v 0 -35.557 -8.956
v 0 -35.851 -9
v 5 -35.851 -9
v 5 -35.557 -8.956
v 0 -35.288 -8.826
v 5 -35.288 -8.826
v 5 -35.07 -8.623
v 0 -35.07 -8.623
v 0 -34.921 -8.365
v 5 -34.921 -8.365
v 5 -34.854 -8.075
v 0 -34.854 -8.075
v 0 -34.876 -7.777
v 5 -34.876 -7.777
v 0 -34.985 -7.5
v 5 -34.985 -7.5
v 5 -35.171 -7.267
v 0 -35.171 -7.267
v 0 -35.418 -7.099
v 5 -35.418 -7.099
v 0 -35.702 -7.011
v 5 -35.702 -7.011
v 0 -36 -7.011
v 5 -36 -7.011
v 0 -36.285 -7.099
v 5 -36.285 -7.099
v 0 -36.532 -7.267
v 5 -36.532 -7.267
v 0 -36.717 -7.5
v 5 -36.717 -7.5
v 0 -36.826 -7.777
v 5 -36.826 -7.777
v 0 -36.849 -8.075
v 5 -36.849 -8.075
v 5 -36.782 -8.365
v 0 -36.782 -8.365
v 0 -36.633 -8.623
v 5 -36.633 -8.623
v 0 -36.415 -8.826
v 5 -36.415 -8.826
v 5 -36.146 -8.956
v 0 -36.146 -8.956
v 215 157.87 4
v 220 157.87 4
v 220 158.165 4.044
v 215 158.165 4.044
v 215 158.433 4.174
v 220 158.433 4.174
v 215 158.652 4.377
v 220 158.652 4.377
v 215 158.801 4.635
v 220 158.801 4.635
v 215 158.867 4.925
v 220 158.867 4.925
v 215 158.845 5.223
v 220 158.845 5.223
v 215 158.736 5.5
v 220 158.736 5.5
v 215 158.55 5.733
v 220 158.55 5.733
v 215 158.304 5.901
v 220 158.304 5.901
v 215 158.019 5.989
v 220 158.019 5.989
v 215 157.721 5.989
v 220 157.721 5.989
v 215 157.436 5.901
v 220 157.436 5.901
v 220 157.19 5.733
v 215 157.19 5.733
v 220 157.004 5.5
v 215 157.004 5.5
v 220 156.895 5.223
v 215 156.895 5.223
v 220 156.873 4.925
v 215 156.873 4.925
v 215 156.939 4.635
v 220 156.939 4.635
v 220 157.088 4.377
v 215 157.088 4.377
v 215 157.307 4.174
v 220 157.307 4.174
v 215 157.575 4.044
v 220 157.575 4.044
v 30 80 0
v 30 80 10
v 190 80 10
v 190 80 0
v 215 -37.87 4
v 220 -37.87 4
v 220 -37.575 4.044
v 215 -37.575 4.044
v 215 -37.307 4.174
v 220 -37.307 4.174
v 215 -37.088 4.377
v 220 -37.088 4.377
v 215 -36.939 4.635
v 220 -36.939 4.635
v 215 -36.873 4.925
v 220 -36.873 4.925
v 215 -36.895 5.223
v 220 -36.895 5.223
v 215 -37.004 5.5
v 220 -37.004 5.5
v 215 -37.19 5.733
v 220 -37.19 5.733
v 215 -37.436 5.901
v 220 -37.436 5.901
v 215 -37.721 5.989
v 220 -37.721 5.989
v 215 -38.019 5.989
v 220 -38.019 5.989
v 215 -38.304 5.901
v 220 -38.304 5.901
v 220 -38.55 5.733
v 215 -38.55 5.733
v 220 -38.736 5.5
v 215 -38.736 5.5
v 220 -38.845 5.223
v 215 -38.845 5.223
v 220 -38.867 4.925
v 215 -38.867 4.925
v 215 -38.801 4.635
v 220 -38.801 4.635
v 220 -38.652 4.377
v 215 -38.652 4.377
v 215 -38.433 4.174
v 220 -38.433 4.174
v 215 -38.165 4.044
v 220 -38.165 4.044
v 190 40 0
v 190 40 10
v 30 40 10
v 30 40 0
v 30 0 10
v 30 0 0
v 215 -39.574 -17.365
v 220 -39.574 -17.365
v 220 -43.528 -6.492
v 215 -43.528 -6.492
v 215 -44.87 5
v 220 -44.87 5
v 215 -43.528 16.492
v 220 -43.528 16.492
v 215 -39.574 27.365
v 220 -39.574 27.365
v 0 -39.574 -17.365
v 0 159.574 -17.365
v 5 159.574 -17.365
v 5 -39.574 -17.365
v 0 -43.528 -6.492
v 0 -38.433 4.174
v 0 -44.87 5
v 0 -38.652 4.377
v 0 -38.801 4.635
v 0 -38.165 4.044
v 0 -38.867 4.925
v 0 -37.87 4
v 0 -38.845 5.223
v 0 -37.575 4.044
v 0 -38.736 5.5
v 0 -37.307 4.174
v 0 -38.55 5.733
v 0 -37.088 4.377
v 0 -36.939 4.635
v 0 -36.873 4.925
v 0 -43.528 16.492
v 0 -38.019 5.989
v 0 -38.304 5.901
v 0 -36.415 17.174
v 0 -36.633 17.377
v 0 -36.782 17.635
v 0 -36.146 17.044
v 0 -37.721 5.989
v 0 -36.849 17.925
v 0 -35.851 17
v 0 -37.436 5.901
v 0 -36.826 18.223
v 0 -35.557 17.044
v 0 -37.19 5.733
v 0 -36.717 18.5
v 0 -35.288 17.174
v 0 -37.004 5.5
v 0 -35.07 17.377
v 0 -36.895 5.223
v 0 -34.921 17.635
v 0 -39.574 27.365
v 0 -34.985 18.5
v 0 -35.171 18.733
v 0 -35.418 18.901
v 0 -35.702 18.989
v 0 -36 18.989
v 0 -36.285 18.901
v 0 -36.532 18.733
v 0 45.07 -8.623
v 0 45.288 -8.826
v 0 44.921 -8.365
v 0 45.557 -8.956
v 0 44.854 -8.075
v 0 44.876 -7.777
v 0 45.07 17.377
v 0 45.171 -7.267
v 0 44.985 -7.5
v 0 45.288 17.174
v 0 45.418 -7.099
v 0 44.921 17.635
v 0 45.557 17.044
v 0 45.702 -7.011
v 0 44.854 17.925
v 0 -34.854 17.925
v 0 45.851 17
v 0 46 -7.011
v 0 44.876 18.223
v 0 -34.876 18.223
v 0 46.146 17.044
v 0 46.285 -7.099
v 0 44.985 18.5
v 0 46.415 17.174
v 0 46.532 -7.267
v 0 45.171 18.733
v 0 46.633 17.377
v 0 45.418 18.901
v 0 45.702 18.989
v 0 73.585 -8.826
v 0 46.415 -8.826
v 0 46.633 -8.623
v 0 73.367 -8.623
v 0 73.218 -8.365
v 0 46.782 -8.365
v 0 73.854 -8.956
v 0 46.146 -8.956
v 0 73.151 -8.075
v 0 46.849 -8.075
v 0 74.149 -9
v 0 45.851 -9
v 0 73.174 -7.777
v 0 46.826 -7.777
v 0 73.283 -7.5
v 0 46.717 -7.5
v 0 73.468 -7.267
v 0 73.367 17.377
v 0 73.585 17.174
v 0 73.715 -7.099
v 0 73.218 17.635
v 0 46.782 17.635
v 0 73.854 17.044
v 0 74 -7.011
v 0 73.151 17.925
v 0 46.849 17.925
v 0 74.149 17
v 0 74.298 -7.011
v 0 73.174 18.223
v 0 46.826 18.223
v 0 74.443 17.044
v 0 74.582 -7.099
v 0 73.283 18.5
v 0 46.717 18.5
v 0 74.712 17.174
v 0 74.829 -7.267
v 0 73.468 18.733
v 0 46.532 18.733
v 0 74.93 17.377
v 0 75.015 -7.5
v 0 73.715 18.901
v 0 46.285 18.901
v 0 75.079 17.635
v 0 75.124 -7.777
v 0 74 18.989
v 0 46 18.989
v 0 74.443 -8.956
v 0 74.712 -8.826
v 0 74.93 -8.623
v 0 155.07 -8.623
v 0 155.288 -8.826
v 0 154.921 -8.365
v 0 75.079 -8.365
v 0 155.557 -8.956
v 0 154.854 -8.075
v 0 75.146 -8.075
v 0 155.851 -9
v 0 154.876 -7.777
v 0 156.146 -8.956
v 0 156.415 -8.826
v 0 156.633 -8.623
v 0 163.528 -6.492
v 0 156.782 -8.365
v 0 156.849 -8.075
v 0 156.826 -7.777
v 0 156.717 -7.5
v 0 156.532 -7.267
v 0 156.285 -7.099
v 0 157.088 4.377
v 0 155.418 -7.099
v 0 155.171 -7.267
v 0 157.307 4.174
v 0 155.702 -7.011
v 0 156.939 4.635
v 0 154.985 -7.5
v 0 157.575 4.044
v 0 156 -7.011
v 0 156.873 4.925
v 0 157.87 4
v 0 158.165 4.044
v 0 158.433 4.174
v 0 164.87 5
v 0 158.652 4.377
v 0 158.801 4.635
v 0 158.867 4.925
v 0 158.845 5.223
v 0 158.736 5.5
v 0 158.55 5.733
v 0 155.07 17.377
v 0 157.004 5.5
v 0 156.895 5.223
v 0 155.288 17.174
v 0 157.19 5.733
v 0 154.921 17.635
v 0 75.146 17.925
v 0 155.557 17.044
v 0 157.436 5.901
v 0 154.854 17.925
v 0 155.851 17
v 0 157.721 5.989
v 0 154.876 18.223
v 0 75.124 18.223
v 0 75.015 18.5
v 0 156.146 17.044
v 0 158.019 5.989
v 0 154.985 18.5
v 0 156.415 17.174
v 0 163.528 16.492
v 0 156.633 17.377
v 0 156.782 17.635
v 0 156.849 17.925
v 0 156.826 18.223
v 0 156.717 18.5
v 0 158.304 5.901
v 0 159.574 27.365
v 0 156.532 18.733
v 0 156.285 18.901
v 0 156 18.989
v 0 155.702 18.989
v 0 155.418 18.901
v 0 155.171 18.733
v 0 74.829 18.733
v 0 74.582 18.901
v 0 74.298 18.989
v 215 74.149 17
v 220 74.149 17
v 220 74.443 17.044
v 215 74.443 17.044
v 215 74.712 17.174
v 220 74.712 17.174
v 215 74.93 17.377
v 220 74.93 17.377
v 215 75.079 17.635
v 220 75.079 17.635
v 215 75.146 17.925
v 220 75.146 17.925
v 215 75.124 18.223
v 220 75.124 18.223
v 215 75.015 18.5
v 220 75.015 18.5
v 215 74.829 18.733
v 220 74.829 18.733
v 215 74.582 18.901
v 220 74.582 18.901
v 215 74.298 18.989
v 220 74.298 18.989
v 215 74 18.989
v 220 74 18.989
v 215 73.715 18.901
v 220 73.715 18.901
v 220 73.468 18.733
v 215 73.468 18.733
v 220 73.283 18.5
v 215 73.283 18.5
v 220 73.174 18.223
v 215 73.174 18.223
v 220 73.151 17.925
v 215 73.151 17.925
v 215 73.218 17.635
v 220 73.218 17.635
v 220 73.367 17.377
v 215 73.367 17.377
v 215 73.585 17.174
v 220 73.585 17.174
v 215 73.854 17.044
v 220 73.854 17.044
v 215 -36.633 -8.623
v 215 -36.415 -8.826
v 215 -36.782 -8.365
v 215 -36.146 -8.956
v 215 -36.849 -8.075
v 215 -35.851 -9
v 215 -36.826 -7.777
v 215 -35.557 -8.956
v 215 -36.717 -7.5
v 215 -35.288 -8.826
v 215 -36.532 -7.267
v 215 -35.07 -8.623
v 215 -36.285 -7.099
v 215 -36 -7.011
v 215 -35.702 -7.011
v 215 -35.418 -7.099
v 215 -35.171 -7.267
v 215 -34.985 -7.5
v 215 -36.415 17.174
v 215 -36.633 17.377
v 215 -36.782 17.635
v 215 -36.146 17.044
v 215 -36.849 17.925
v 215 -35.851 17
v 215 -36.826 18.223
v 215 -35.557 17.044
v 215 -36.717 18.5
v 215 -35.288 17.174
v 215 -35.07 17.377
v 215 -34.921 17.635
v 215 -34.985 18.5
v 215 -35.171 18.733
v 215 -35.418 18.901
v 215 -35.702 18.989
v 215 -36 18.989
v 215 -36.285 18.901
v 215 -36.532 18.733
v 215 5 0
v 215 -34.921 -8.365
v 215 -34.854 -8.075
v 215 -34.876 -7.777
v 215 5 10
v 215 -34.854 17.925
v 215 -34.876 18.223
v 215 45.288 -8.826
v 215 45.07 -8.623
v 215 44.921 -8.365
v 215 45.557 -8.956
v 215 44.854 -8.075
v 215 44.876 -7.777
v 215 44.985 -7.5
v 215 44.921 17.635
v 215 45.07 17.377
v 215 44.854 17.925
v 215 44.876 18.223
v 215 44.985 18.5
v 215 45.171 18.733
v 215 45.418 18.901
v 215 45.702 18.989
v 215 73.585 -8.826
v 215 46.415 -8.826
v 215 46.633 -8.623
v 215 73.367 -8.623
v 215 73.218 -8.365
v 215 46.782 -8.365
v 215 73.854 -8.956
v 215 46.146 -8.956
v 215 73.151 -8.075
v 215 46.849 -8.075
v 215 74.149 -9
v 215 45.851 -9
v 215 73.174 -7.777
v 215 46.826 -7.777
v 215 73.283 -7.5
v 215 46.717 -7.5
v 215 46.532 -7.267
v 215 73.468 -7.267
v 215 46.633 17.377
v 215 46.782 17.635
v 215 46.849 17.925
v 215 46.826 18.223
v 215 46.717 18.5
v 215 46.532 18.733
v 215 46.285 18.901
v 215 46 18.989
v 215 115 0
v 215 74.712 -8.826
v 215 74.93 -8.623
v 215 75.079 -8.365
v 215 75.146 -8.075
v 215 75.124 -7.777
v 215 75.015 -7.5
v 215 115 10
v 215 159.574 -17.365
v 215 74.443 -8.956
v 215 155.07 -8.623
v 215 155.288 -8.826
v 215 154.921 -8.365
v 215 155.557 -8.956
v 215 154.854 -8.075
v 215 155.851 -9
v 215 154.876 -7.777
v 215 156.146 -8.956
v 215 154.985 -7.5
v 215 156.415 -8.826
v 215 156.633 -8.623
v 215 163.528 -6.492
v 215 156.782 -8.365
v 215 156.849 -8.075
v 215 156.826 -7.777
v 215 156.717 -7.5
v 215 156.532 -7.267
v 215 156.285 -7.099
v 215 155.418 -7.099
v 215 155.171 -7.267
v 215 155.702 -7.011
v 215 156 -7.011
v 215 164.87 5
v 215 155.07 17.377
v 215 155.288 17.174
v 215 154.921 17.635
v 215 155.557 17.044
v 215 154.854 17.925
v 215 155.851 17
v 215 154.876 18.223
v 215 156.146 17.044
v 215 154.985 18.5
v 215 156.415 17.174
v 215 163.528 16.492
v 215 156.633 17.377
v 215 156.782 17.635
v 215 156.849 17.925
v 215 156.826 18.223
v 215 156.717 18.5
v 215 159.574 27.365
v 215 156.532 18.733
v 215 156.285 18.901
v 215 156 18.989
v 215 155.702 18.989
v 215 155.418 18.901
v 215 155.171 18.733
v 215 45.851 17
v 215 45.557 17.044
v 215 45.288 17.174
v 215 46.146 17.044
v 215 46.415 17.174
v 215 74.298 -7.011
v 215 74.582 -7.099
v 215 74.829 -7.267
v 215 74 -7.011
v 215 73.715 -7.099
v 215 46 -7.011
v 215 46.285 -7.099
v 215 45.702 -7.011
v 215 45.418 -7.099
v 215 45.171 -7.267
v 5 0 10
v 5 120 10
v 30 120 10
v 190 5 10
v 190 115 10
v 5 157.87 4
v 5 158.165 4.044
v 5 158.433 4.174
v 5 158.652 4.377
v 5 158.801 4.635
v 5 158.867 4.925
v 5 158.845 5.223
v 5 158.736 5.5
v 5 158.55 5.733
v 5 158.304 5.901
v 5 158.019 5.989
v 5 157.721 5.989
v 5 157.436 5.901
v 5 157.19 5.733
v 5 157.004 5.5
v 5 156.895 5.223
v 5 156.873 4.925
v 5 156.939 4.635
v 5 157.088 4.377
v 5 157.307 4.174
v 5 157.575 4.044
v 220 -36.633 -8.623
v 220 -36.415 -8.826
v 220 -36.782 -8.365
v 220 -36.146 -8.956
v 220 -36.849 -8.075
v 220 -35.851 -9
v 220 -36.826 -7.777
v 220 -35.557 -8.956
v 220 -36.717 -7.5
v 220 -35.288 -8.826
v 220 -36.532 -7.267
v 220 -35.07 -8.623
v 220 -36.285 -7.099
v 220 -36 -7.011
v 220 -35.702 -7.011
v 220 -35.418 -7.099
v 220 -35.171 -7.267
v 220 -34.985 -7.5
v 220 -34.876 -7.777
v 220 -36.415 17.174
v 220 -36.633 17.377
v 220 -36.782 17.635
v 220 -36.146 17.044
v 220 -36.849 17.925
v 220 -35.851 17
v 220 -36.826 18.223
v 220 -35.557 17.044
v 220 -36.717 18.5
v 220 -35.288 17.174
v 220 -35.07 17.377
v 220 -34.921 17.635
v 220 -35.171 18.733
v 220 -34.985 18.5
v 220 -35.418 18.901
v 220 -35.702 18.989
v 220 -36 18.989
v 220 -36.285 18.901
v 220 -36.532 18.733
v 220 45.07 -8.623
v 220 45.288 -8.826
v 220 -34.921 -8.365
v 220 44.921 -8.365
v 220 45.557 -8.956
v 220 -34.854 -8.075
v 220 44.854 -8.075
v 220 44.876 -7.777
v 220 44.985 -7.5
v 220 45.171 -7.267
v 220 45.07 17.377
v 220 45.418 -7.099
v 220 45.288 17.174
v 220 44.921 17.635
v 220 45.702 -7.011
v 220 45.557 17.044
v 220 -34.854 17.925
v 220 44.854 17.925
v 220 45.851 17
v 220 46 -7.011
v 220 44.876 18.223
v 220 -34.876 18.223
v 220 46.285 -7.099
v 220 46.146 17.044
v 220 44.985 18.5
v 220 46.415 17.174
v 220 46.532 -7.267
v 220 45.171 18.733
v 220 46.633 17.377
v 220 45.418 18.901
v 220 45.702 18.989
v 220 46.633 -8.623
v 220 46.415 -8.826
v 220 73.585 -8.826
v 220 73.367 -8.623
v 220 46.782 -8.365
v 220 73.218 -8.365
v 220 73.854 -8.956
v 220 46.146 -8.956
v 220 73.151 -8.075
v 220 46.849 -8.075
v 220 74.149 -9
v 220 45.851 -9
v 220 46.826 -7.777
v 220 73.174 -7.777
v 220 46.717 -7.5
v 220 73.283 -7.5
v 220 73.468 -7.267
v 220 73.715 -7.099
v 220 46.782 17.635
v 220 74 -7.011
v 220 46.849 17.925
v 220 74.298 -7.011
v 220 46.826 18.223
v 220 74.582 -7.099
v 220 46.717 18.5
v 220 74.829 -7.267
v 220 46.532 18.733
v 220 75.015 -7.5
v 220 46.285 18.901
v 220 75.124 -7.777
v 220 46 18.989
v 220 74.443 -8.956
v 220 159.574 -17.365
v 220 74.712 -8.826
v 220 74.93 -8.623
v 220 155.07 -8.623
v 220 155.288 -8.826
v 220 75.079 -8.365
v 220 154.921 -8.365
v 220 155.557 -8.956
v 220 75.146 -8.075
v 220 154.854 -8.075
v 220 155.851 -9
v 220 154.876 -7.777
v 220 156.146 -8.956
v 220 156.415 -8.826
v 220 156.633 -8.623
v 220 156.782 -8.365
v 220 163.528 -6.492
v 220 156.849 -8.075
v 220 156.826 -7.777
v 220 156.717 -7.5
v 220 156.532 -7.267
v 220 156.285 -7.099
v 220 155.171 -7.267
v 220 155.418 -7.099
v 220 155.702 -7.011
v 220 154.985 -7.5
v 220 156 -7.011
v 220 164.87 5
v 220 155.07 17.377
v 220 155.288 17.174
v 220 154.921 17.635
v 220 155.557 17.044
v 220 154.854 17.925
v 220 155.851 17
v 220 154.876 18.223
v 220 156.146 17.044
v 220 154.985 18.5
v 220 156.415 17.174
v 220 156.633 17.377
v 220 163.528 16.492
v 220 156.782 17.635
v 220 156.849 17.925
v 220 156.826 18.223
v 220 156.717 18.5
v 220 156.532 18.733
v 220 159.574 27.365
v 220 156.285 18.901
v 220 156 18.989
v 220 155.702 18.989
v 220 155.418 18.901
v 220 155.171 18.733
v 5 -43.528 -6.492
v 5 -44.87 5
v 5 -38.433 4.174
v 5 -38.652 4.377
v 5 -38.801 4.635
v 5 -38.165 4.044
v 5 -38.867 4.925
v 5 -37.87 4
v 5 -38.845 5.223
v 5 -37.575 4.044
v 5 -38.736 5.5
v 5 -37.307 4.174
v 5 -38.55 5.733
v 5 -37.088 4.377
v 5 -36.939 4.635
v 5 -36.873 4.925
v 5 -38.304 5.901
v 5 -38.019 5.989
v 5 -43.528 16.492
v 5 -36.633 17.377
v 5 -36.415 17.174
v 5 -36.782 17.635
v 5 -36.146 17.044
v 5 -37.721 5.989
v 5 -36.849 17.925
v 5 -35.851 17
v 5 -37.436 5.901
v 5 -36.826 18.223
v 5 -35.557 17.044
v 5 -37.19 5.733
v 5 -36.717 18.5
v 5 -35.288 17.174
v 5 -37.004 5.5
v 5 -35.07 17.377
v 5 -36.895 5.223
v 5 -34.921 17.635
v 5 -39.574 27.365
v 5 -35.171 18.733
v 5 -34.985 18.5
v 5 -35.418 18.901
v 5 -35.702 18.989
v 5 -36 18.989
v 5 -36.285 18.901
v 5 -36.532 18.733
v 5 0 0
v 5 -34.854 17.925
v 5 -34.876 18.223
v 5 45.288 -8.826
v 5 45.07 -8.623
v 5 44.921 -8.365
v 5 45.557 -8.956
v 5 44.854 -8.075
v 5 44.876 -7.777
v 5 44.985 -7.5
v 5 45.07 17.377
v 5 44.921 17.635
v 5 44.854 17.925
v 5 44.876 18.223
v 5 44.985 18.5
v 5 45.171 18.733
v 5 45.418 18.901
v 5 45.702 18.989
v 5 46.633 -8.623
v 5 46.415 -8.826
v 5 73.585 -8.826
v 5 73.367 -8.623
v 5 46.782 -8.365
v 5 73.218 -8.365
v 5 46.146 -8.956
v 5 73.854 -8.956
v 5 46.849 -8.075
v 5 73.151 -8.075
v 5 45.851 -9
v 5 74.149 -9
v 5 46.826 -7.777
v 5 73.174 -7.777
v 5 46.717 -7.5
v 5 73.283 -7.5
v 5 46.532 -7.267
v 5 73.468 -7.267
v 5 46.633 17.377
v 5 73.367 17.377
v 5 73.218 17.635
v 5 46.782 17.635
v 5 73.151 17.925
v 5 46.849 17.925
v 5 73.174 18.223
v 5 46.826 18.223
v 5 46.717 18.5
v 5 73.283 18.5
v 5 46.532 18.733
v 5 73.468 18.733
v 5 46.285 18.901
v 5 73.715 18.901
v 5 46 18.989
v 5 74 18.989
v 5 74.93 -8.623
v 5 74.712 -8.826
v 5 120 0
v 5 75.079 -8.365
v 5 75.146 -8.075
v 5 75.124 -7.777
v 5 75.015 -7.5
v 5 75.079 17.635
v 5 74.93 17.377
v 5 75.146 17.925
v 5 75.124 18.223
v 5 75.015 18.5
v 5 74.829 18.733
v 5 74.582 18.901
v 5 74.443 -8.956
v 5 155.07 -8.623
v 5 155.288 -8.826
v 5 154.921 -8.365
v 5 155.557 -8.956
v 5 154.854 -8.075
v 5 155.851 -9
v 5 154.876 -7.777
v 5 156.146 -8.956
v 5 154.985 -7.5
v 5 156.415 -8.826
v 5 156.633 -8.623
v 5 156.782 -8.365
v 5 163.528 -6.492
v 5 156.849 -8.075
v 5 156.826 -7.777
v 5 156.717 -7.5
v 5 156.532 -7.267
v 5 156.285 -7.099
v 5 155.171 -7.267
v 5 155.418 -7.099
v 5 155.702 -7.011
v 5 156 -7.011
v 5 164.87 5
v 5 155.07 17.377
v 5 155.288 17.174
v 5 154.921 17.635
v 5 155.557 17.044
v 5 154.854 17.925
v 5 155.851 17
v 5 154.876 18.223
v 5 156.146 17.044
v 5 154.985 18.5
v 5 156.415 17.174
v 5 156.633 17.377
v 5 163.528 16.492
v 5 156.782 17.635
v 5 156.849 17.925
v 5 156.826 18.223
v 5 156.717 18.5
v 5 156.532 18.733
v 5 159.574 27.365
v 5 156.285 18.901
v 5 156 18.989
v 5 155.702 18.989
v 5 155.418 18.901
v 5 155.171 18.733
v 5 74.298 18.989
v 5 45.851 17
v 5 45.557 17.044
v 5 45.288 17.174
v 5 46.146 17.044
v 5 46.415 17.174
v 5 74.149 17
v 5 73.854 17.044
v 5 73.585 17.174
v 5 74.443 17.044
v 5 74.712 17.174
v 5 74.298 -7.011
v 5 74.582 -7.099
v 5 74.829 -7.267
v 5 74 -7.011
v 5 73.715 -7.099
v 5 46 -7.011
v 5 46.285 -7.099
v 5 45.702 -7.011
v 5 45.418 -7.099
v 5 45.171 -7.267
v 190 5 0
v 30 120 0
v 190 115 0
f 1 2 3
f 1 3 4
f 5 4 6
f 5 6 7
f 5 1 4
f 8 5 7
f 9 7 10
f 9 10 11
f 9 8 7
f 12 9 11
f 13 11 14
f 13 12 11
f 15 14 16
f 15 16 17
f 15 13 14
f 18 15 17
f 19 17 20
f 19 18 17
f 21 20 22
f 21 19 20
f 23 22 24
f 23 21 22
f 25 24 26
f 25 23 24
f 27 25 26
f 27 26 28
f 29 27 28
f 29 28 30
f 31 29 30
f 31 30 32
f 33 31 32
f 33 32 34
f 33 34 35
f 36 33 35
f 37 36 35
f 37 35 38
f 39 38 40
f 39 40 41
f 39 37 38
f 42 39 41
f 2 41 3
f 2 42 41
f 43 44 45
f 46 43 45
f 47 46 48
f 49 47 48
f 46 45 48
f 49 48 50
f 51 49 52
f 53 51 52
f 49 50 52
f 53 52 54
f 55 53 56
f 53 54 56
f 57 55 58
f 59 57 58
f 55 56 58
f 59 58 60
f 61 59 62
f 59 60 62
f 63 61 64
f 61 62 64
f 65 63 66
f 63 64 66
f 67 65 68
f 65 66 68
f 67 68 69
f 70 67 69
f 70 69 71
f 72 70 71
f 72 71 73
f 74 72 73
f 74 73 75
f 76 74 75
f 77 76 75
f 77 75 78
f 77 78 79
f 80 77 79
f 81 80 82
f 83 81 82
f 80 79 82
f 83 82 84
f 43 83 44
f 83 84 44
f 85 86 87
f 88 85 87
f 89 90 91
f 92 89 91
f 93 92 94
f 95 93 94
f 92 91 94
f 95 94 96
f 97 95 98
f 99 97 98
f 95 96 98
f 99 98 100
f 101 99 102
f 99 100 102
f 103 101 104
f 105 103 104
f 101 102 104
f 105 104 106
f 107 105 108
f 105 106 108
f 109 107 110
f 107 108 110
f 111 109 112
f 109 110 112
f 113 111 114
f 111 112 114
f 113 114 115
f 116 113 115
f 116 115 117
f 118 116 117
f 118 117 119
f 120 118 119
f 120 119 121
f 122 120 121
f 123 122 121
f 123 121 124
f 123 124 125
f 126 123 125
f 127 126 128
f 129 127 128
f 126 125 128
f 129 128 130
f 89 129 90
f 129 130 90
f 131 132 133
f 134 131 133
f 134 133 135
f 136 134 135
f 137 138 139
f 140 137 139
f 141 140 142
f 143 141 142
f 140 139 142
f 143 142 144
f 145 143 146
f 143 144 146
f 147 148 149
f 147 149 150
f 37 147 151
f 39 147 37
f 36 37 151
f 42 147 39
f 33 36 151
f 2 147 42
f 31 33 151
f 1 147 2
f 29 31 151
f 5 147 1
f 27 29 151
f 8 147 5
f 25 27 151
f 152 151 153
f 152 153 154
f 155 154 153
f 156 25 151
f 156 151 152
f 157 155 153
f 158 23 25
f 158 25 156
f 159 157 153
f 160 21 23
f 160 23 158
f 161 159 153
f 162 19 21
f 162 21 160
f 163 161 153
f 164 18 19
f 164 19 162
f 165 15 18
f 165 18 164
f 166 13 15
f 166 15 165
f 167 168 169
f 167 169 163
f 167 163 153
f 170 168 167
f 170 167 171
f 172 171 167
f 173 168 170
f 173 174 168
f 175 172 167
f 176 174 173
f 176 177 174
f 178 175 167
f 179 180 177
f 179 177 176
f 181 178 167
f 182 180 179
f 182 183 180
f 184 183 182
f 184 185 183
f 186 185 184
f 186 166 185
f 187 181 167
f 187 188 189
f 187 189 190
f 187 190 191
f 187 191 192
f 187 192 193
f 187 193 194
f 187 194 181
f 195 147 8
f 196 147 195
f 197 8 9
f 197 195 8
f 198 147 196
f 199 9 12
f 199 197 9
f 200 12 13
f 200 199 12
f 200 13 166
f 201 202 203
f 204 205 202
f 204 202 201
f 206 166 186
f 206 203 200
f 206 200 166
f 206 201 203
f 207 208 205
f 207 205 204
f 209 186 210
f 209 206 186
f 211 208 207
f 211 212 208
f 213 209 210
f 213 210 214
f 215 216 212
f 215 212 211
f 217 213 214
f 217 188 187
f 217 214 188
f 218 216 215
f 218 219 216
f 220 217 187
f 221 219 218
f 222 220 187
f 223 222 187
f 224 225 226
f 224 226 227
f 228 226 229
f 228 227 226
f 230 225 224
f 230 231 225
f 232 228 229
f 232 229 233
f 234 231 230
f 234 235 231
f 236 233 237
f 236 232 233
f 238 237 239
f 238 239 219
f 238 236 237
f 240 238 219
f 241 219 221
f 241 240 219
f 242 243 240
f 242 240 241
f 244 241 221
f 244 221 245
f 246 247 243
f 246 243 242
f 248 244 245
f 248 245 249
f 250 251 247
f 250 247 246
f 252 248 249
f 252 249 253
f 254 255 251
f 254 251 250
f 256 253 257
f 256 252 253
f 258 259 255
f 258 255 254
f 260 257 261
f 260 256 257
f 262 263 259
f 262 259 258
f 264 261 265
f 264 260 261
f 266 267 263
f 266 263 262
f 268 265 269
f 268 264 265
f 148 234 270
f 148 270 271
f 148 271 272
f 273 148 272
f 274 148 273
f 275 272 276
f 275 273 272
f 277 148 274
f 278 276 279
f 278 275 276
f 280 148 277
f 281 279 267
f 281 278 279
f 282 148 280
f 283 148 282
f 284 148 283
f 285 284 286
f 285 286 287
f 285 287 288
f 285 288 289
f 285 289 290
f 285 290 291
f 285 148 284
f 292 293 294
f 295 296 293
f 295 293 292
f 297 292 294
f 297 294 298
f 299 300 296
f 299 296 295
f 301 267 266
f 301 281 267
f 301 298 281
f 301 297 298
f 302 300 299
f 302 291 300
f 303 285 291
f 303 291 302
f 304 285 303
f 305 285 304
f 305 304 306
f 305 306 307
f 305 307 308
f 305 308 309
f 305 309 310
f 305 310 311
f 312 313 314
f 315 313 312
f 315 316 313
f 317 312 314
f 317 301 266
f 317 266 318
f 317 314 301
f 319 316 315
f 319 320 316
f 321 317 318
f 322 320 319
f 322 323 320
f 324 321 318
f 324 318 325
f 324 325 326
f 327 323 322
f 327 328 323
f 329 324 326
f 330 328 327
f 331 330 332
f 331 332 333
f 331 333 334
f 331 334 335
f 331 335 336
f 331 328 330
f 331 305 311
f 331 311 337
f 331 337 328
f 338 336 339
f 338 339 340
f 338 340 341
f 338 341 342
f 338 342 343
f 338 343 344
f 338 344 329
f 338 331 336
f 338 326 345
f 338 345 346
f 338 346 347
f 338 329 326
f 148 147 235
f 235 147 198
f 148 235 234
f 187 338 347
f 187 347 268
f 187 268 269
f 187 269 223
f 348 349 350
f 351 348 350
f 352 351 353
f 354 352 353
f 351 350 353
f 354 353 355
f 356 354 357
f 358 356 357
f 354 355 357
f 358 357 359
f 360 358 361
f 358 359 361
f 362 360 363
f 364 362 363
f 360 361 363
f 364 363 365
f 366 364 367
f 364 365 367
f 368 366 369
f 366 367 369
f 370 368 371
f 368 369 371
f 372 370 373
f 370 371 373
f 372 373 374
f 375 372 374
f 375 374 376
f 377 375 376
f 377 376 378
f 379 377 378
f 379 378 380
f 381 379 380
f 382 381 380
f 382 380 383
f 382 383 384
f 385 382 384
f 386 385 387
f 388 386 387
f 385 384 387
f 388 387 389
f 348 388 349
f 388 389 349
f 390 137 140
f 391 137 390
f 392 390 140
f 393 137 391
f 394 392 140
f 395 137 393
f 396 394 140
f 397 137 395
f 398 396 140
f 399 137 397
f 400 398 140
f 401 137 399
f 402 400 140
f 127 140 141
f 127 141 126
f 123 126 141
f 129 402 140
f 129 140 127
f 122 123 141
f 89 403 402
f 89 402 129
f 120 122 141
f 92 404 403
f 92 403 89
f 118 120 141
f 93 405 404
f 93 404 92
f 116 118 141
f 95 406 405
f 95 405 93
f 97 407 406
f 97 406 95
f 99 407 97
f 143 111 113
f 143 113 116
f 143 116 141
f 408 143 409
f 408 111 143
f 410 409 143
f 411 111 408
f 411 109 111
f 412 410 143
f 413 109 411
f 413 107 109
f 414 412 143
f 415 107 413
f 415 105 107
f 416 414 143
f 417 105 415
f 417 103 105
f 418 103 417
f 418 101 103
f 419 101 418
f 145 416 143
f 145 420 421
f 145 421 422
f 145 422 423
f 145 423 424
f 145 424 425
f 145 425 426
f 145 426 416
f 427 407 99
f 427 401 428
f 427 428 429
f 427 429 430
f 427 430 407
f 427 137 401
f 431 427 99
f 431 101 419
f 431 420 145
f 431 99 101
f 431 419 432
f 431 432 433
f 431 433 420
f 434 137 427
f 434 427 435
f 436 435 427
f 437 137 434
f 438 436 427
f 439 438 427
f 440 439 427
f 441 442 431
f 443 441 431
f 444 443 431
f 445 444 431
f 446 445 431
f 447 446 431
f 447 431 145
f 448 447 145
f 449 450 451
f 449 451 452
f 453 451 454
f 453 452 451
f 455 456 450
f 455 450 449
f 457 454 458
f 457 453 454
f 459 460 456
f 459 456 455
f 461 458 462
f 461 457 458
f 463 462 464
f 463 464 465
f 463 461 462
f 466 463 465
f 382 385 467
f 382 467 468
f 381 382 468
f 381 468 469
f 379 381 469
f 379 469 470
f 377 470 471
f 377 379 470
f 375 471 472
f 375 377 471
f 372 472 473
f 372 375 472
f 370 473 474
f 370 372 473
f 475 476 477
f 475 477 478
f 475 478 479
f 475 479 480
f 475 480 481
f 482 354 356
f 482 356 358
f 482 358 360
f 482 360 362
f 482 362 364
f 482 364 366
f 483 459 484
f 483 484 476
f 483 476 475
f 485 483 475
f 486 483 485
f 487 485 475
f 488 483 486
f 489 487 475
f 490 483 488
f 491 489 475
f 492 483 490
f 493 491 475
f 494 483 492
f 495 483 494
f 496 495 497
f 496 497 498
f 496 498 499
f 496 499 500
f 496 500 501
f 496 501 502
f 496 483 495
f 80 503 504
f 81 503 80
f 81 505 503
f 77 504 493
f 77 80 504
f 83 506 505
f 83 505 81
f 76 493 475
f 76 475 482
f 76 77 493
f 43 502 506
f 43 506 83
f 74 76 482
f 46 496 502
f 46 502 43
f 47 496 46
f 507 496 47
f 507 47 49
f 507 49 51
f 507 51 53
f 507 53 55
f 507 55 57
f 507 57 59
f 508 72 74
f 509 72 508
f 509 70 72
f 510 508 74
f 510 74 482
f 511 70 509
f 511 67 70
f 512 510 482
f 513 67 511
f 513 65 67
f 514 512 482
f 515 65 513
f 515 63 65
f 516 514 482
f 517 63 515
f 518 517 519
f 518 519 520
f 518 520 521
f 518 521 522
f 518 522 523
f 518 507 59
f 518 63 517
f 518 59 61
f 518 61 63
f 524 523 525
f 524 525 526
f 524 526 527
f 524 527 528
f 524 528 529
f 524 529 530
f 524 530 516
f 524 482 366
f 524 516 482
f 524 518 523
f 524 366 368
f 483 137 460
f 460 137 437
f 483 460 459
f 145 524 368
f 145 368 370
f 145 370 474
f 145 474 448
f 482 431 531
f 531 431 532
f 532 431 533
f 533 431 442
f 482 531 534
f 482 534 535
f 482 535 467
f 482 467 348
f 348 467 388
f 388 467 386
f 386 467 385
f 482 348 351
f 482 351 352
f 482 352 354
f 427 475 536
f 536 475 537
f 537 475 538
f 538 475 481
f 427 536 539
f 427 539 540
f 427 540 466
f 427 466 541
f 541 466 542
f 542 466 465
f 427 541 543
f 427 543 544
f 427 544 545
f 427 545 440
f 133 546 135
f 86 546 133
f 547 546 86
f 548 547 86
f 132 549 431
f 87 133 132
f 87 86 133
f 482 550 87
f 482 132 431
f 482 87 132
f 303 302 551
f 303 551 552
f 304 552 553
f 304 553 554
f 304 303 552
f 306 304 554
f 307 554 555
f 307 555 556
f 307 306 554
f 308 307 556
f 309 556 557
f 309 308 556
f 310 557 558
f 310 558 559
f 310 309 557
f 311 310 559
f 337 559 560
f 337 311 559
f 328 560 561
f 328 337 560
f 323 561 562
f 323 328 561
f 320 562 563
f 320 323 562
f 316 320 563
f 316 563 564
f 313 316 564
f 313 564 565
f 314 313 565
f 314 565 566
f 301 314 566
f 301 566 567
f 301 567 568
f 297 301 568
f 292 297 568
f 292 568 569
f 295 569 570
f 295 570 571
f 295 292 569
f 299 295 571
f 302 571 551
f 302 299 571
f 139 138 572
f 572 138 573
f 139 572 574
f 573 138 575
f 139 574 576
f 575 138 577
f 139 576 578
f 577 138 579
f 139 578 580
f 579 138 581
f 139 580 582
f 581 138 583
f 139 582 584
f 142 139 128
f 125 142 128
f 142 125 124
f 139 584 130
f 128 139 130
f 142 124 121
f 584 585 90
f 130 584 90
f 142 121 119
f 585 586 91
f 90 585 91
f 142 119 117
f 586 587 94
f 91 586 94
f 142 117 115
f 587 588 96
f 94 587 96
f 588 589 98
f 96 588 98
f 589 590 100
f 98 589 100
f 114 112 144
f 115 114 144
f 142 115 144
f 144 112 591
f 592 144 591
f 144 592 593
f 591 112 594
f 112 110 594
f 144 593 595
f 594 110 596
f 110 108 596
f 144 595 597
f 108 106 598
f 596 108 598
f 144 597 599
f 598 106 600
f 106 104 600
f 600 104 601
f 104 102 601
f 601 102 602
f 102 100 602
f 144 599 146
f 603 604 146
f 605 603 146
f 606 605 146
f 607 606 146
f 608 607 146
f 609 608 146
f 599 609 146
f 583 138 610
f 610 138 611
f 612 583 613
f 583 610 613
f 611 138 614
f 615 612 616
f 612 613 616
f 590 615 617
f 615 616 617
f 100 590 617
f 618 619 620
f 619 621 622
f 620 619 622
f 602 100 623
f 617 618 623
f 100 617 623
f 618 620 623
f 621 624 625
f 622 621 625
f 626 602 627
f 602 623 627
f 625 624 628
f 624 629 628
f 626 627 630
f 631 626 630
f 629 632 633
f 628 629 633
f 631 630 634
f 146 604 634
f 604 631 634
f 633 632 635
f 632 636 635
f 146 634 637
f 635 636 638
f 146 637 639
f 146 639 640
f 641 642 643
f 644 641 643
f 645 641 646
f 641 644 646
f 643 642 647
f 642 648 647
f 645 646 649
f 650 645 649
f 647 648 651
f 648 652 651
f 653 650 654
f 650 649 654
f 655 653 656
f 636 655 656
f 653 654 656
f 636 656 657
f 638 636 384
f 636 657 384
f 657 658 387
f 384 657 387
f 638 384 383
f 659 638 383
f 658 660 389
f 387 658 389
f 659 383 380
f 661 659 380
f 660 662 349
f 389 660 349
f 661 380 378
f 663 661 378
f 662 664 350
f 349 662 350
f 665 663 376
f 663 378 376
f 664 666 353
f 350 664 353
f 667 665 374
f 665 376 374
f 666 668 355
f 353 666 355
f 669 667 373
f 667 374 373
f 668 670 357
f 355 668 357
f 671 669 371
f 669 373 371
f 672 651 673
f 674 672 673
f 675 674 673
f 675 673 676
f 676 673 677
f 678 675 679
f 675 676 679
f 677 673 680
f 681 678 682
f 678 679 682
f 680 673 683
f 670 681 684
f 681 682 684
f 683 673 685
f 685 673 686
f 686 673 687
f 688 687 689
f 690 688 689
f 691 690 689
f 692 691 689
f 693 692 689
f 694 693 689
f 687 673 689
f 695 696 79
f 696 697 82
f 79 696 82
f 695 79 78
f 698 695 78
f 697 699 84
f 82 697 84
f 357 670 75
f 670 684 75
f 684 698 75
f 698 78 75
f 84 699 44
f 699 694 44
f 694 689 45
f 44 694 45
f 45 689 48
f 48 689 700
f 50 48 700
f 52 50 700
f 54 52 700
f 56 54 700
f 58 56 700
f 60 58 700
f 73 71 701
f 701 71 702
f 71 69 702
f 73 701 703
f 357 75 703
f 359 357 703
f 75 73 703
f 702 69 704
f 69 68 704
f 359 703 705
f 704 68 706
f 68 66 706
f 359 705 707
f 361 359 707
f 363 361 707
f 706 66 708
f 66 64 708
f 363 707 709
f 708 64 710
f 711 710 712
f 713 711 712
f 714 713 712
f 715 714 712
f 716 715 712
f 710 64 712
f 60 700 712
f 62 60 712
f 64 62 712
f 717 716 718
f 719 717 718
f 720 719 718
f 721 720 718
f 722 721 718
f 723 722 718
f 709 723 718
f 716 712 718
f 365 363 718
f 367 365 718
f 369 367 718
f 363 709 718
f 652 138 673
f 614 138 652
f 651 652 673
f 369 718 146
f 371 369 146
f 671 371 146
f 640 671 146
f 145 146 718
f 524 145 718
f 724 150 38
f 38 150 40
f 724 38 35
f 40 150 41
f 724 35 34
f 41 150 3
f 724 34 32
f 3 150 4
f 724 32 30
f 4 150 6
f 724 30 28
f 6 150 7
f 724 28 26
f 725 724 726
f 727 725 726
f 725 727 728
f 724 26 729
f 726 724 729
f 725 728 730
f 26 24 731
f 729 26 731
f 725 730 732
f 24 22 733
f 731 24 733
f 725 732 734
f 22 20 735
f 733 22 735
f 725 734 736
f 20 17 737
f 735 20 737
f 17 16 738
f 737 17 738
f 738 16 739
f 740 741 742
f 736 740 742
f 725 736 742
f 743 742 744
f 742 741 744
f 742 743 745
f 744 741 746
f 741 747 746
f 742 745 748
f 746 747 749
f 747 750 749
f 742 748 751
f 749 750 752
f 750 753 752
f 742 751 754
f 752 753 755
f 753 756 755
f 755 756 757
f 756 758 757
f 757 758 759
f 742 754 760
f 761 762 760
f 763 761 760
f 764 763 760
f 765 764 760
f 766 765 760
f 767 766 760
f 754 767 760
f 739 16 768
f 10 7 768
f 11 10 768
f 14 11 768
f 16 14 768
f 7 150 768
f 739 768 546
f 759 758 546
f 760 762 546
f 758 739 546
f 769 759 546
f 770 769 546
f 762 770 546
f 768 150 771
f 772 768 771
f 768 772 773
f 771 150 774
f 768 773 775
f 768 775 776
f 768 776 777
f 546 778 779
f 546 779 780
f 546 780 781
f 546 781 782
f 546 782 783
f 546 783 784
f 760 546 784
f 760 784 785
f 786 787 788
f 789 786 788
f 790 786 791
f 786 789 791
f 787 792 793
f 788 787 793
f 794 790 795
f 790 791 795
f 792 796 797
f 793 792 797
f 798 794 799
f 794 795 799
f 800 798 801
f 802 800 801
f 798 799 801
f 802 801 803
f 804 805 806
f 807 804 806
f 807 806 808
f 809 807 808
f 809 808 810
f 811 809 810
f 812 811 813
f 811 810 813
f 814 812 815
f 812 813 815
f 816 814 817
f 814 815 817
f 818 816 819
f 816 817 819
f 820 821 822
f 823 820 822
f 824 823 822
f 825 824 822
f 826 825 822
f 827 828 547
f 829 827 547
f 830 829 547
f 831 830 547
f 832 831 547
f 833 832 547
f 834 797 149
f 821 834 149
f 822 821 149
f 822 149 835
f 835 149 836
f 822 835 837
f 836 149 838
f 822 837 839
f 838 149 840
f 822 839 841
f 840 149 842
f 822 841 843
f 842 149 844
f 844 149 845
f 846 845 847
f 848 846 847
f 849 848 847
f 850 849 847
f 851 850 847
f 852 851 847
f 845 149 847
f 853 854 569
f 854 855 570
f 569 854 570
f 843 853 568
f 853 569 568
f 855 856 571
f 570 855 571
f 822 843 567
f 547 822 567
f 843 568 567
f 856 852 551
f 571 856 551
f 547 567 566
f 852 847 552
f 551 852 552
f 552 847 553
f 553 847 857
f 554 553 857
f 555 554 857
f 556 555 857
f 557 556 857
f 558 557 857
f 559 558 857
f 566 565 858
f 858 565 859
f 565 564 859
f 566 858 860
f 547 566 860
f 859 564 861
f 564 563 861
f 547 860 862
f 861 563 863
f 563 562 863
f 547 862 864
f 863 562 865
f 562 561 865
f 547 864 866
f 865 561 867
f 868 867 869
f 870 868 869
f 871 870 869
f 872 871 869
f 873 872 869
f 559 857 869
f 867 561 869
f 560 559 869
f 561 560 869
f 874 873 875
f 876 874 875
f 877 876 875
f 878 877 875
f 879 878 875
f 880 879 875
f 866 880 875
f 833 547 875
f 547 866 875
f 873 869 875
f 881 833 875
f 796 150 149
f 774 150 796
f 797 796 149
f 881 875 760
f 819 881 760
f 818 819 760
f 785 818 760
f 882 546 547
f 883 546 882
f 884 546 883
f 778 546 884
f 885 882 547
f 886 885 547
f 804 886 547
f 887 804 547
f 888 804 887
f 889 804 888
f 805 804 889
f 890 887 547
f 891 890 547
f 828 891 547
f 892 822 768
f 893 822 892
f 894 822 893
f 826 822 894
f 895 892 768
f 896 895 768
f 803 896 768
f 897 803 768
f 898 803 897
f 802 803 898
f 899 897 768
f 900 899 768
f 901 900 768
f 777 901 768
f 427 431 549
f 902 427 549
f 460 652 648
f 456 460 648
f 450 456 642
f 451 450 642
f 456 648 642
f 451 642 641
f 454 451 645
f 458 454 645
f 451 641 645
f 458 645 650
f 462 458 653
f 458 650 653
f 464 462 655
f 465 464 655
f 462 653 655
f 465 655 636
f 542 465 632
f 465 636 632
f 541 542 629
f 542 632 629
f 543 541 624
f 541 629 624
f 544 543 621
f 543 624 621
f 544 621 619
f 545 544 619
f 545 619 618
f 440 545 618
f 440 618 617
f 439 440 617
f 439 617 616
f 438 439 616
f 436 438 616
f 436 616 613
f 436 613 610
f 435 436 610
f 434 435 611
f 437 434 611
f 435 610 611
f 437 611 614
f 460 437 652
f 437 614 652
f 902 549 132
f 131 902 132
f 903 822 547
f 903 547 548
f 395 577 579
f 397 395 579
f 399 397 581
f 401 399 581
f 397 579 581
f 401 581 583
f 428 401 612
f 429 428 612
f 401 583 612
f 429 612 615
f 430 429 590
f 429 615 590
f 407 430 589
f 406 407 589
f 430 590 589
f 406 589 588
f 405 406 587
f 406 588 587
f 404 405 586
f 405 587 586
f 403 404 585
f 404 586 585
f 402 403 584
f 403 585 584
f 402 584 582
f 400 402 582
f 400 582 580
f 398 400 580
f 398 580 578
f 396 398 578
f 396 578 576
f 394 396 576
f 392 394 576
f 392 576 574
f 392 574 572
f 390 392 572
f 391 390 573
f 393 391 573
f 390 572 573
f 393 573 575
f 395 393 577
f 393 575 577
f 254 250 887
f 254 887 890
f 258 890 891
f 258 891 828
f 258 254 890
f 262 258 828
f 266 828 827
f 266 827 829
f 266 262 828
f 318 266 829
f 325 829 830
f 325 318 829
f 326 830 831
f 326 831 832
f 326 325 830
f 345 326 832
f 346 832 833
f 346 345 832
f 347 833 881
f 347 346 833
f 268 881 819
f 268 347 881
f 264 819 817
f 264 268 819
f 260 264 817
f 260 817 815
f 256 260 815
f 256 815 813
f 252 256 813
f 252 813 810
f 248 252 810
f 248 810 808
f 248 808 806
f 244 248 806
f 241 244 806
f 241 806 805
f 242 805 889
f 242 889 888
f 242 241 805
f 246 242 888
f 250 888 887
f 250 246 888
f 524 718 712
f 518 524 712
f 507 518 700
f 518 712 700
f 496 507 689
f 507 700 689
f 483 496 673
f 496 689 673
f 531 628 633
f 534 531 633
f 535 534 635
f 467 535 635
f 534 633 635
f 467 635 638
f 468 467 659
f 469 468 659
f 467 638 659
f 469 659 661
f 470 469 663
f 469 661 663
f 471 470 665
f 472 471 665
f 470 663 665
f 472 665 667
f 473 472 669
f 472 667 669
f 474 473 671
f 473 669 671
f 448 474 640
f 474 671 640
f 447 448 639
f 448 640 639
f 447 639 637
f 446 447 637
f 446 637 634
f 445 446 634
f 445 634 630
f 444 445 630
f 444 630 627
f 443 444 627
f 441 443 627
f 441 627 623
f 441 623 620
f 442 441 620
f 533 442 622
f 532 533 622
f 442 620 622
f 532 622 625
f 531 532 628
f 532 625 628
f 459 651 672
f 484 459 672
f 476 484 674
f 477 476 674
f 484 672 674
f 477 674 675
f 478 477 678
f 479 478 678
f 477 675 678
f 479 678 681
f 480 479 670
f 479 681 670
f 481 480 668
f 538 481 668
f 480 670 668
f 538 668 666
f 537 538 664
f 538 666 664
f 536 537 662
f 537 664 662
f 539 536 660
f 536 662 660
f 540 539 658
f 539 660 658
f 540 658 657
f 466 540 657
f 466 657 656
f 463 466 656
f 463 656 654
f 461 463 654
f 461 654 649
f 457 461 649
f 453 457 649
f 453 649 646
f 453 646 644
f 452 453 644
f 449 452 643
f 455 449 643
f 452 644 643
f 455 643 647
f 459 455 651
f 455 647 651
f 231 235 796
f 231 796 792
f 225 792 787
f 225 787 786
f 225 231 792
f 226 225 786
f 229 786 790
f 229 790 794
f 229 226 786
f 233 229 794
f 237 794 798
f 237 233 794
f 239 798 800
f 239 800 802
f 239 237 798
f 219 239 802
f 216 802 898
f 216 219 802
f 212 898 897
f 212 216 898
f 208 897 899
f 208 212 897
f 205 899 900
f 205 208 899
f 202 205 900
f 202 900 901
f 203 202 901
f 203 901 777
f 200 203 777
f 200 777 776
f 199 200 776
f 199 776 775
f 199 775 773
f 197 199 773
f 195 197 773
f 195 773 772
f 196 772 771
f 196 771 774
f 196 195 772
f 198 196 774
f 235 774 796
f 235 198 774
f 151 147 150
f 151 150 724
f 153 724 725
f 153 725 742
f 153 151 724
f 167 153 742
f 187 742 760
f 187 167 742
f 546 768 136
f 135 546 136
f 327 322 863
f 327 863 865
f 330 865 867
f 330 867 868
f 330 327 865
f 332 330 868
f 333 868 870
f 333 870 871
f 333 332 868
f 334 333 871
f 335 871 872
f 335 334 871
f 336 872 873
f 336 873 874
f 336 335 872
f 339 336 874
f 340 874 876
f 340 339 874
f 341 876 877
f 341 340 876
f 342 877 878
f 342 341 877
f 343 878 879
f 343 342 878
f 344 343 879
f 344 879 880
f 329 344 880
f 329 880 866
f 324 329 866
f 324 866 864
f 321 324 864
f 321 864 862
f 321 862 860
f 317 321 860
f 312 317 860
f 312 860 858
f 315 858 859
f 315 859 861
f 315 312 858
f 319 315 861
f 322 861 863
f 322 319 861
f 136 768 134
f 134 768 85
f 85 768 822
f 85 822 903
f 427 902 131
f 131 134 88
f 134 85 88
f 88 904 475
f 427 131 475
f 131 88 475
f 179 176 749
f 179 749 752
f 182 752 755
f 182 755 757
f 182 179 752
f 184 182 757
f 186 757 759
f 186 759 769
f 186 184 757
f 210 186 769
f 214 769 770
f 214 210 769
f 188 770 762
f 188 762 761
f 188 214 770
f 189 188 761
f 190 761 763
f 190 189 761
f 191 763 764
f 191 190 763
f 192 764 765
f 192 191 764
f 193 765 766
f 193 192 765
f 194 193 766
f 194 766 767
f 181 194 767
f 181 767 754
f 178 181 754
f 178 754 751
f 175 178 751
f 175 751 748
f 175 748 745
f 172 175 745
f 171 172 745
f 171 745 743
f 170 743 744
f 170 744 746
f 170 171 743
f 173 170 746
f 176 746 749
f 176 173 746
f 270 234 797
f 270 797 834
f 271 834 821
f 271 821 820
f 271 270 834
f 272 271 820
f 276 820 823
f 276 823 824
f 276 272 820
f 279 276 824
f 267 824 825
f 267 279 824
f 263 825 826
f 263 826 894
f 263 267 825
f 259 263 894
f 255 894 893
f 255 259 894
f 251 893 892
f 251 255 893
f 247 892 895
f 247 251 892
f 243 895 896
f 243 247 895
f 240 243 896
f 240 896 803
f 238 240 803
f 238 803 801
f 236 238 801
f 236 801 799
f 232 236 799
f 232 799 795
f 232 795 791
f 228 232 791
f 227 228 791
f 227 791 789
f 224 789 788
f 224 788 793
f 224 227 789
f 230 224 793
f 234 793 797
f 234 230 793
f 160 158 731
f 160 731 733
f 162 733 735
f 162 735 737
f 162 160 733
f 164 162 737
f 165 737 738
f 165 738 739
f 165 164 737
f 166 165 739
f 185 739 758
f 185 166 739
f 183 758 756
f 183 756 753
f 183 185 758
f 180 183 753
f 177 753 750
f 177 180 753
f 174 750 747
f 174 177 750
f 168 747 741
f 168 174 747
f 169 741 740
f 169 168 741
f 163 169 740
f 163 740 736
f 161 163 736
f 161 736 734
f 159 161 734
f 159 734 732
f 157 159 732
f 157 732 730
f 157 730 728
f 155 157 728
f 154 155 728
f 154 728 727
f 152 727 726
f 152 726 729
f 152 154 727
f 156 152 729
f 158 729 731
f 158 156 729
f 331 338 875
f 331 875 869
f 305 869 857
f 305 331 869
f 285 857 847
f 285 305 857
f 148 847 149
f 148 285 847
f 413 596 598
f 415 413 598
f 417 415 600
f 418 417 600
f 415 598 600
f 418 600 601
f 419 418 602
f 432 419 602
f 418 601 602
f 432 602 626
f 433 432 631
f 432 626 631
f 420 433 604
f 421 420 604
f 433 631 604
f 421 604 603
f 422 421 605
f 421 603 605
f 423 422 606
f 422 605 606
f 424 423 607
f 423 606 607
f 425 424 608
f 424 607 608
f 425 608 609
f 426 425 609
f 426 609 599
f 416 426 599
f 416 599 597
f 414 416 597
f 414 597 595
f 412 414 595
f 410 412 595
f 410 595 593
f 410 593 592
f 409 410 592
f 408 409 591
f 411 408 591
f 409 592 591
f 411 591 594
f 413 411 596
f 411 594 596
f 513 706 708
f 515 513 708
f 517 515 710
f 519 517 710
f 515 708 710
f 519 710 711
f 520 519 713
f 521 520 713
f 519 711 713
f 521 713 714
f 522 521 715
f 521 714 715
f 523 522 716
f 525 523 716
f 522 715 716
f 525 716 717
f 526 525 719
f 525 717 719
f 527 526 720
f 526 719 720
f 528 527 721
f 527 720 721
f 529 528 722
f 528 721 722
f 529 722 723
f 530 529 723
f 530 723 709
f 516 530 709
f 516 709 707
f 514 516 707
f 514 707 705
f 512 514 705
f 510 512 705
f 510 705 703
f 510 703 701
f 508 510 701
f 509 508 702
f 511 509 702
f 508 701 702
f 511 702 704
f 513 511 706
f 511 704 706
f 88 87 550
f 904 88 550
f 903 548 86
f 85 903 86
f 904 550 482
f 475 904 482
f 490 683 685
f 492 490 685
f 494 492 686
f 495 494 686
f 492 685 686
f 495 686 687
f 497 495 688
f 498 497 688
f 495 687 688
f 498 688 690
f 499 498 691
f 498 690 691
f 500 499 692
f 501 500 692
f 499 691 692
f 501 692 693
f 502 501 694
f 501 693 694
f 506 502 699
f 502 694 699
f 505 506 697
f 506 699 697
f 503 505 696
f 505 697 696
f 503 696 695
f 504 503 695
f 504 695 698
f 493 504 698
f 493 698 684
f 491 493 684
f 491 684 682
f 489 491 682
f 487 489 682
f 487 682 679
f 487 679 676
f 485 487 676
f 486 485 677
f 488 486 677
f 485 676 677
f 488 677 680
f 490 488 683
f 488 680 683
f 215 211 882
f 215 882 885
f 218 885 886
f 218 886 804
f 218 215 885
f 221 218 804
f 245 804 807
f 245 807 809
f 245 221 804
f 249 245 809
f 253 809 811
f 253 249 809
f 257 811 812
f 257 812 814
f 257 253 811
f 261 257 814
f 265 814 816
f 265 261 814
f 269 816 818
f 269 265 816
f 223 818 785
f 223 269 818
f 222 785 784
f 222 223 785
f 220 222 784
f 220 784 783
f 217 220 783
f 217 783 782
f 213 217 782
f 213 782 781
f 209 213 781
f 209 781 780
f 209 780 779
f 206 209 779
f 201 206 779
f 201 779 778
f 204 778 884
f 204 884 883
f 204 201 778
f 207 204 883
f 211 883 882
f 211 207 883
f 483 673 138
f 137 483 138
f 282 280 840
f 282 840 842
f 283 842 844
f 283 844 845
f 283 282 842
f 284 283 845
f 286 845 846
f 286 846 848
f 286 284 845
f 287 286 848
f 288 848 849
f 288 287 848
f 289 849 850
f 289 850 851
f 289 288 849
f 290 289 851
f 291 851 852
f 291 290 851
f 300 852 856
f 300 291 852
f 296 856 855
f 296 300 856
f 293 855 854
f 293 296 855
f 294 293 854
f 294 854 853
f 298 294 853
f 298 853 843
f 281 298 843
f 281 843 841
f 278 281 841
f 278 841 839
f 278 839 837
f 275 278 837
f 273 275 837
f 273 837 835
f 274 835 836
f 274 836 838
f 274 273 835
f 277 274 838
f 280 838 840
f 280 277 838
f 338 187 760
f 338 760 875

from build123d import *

# Parameters (mm, degrees)
SKETCH_1_W          = 220
SKETCH_1_H          = 120
EXTRUDE_1_DEPTH     = 10
CUT_EXTRUDE_1_DEPTH = 10
SKETCH_5_R          = 1
SKETCH_5_W          = 10
SKETCH_5_H          = 110
EXTRUDE_2_DEPTH     = 5


with BuildPart() as part:
    # 草图1 → 凸台-拉伸1 (new body)
    with BuildSketch(Plane.XY):
        with Locations((110, 60)):
            Rectangle(SKETCH_1_W, SKETCH_1_H)
    extrude(amount=EXTRUDE_1_DEPTH)

    # 草图2 → 切除-拉伸1 (cut)
    with BuildSketch(Plane.XY.offset(10)):
        Polygon((220, 120), (30, 120), (30, 80), (190, 80), (190, 115), (220, 115), align=None)
        Polygon((220, 0), (220, 5), (190, 5), (190, 40), (30, 40), (30, 0), align=None)
    extrude(amount=-CUT_EXTRUDE_1_DEPTH, mode=Mode.SUBTRACT)

    # 草图5 → 凸台-拉伸2 (add)
    # profile 1 of 3: a face of its own
    with BuildSketch(Plane(origin=(220, 0, 0), x_dir=(0, 0, -1), z_dir=(1, 0, 0))):
        with BuildLine():
            Line((-27.365, 70.42619968), (-27.365, 159.57380032))
            ThreePointArc((-27.365, 159.57380032), (-5, 164.87), (17.365, 159.57380032))
            Line((17.365, 159.57380032), (17.365, 70.42619968))
            Line((17.365, 70.42619968), (17.365, 49.57380032))
            Line((17.365, 49.57380032), (17.365, -39.57380032))
            ThreePointArc((17.365, -39.57380032), (-5, -44.87), (-27.365, -39.57380032))
            Line((-27.365, -39.57380032), (-27.365, 49.57380032))
            Line((-27.365, 49.57380032), (-27.365, 70.42619968))
        make_face()
        with Locations((-5, 157.87)):
            Circle(SKETCH_5_R, mode=Mode.SUBTRACT)
        with Locations((-18, 155.851400221)):
            Circle(SKETCH_5_R, mode=Mode.SUBTRACT)
        with Locations((8, 155.851400221)):
            Circle(SKETCH_5_R, mode=Mode.SUBTRACT)
        with Locations((8, 74.148599779)):
            Circle(SKETCH_5_R, mode=Mode.SUBTRACT)
        with Locations((-18, 74.148599779)):
            Circle(SKETCH_5_R, mode=Mode.SUBTRACT)
        with Locations((-18, 45.851400221)):
            Circle(SKETCH_5_R, mode=Mode.SUBTRACT)
        with Locations((8, 45.851400221)):
            Circle(SKETCH_5_R, mode=Mode.SUBTRACT)
        with Locations((8, -35.851400221)):
            Circle(SKETCH_5_R, mode=Mode.SUBTRACT)
        with Locations((-18, -35.851400221)):
            Circle(SKETCH_5_R, mode=Mode.SUBTRACT)
        with Locations((-5, -37.87)):
            Circle(SKETCH_5_R, mode=Mode.SUBTRACT)
        with Locations((-5, 60)):
            Rectangle(SKETCH_5_W, SKETCH_5_H, mode=Mode.SUBTRACT)
    # profile 2 of 3: a face of its own
    with BuildSketch(Plane(origin=(220, 0, 0), x_dir=(0, 0, -1), z_dir=(1, 0, 0))):
        with Locations((-5, 47.87)):
            Circle(SKETCH_5_R)
    # profile 3 of 3: a face of its own
    with BuildSketch(Plane(origin=(220, 0, 0), x_dir=(0, 0, -1), z_dir=(1, 0, 0))):
        with Locations((-5, 72.13)):
            Circle(SKETCH_5_R)
    extrude_2 = extrude(amount=-EXTRUDE_2_DEPTH)

    # 镜向1: 凸台-拉伸2 across plane
    add(extrude_2.mirror(Plane(origin=(110, 0, 0), x_dir=(0, 0, 1), z_dir=(1, 0, 0))))


solid = part.part
